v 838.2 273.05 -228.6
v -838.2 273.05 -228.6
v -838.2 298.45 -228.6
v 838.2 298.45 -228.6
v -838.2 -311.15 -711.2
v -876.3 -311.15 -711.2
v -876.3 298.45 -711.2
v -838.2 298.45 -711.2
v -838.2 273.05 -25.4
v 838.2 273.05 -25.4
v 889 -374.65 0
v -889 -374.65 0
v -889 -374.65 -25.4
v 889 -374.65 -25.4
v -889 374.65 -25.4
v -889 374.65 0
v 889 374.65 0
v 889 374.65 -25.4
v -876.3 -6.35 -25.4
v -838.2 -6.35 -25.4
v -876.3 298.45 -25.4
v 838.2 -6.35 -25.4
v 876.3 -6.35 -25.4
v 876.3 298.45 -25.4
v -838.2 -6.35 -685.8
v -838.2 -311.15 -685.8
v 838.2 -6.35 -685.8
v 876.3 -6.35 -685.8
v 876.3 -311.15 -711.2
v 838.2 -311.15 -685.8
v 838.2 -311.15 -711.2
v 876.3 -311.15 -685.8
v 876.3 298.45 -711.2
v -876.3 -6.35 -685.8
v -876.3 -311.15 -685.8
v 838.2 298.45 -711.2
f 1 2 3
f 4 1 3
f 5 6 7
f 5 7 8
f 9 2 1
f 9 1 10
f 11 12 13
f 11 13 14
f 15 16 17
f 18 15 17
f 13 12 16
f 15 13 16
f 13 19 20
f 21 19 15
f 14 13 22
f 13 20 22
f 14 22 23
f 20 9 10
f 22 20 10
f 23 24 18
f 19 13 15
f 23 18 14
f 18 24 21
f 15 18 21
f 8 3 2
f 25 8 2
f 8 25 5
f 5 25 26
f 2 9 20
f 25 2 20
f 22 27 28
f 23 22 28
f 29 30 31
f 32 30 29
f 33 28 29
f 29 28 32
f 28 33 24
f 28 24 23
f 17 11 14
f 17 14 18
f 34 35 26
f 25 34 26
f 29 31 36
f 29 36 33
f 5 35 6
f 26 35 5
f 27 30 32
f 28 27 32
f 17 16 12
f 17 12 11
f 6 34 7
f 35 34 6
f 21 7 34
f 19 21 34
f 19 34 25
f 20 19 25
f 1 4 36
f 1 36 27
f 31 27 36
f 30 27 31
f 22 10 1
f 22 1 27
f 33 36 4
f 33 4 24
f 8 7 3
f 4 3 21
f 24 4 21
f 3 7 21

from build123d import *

# Parameters (mm, degrees)
F0_W     = 1778
F0_H     = 749.3
F1_DEPTH = 25.4
F2_W     = 38.1
F2_H     = 304.8
F3_DEPTH = 660.4
F5_W     = 38.1
F5_H     = 609.6
F4_W     = 38.1
F4_H     = 609.6
F6_DEPTH = 25.4
F7_W     = 25.4
F7_H     = 203.2
F8_DEPTH = 1676.4


with BuildPart() as f1:
    # F0 (on Top) → F1 (new body)
    with BuildSketch(Plane.XY):
        Rectangle(F0_W, F0_H)
    extrude(amount=-F1_DEPTH)

    # F2 (on face) → F3 (join)
    with BuildSketch(Plane(origin=(0, 0, -25.4), x_dir=(1, 0, 0), z_dir=(0, 0, -1))):
        with Locations((857.25, -146.05)):
            Rectangle(F2_W, F2_H)
        with Locations((-857.25, -146.05)):
            Rectangle(F2_W, F2_H)
    extrude(amount=F3_DEPTH)

    # F5 (on face) + F4 (on face) → F6 (join)
    with BuildSketch(Plane(origin=(0, 0, -685.8), x_dir=(1, 0, 0), z_dir=(0, 0, -1))):
        with Locations((-857.25, 6.35)):
            Rectangle(F5_W, F5_H)
    with BuildSketch(Plane(origin=(0, 0, -685.8), x_dir=(1, 0, 0), z_dir=(0, 0, -1))):
        with Locations((857.25, 6.35)):
            Rectangle(F4_W, F4_H)
    extrude(amount=F6_DEPTH)

    # F7 (on face) → F8 (join, through all)
    with BuildSketch(Plane.YZ.offset(-838.2)):
        with Locations((285.75, -127)):
            Rectangle(F7_W, F7_H)
    extrude(amount=F8_DEPTH)


solid = f1.part
